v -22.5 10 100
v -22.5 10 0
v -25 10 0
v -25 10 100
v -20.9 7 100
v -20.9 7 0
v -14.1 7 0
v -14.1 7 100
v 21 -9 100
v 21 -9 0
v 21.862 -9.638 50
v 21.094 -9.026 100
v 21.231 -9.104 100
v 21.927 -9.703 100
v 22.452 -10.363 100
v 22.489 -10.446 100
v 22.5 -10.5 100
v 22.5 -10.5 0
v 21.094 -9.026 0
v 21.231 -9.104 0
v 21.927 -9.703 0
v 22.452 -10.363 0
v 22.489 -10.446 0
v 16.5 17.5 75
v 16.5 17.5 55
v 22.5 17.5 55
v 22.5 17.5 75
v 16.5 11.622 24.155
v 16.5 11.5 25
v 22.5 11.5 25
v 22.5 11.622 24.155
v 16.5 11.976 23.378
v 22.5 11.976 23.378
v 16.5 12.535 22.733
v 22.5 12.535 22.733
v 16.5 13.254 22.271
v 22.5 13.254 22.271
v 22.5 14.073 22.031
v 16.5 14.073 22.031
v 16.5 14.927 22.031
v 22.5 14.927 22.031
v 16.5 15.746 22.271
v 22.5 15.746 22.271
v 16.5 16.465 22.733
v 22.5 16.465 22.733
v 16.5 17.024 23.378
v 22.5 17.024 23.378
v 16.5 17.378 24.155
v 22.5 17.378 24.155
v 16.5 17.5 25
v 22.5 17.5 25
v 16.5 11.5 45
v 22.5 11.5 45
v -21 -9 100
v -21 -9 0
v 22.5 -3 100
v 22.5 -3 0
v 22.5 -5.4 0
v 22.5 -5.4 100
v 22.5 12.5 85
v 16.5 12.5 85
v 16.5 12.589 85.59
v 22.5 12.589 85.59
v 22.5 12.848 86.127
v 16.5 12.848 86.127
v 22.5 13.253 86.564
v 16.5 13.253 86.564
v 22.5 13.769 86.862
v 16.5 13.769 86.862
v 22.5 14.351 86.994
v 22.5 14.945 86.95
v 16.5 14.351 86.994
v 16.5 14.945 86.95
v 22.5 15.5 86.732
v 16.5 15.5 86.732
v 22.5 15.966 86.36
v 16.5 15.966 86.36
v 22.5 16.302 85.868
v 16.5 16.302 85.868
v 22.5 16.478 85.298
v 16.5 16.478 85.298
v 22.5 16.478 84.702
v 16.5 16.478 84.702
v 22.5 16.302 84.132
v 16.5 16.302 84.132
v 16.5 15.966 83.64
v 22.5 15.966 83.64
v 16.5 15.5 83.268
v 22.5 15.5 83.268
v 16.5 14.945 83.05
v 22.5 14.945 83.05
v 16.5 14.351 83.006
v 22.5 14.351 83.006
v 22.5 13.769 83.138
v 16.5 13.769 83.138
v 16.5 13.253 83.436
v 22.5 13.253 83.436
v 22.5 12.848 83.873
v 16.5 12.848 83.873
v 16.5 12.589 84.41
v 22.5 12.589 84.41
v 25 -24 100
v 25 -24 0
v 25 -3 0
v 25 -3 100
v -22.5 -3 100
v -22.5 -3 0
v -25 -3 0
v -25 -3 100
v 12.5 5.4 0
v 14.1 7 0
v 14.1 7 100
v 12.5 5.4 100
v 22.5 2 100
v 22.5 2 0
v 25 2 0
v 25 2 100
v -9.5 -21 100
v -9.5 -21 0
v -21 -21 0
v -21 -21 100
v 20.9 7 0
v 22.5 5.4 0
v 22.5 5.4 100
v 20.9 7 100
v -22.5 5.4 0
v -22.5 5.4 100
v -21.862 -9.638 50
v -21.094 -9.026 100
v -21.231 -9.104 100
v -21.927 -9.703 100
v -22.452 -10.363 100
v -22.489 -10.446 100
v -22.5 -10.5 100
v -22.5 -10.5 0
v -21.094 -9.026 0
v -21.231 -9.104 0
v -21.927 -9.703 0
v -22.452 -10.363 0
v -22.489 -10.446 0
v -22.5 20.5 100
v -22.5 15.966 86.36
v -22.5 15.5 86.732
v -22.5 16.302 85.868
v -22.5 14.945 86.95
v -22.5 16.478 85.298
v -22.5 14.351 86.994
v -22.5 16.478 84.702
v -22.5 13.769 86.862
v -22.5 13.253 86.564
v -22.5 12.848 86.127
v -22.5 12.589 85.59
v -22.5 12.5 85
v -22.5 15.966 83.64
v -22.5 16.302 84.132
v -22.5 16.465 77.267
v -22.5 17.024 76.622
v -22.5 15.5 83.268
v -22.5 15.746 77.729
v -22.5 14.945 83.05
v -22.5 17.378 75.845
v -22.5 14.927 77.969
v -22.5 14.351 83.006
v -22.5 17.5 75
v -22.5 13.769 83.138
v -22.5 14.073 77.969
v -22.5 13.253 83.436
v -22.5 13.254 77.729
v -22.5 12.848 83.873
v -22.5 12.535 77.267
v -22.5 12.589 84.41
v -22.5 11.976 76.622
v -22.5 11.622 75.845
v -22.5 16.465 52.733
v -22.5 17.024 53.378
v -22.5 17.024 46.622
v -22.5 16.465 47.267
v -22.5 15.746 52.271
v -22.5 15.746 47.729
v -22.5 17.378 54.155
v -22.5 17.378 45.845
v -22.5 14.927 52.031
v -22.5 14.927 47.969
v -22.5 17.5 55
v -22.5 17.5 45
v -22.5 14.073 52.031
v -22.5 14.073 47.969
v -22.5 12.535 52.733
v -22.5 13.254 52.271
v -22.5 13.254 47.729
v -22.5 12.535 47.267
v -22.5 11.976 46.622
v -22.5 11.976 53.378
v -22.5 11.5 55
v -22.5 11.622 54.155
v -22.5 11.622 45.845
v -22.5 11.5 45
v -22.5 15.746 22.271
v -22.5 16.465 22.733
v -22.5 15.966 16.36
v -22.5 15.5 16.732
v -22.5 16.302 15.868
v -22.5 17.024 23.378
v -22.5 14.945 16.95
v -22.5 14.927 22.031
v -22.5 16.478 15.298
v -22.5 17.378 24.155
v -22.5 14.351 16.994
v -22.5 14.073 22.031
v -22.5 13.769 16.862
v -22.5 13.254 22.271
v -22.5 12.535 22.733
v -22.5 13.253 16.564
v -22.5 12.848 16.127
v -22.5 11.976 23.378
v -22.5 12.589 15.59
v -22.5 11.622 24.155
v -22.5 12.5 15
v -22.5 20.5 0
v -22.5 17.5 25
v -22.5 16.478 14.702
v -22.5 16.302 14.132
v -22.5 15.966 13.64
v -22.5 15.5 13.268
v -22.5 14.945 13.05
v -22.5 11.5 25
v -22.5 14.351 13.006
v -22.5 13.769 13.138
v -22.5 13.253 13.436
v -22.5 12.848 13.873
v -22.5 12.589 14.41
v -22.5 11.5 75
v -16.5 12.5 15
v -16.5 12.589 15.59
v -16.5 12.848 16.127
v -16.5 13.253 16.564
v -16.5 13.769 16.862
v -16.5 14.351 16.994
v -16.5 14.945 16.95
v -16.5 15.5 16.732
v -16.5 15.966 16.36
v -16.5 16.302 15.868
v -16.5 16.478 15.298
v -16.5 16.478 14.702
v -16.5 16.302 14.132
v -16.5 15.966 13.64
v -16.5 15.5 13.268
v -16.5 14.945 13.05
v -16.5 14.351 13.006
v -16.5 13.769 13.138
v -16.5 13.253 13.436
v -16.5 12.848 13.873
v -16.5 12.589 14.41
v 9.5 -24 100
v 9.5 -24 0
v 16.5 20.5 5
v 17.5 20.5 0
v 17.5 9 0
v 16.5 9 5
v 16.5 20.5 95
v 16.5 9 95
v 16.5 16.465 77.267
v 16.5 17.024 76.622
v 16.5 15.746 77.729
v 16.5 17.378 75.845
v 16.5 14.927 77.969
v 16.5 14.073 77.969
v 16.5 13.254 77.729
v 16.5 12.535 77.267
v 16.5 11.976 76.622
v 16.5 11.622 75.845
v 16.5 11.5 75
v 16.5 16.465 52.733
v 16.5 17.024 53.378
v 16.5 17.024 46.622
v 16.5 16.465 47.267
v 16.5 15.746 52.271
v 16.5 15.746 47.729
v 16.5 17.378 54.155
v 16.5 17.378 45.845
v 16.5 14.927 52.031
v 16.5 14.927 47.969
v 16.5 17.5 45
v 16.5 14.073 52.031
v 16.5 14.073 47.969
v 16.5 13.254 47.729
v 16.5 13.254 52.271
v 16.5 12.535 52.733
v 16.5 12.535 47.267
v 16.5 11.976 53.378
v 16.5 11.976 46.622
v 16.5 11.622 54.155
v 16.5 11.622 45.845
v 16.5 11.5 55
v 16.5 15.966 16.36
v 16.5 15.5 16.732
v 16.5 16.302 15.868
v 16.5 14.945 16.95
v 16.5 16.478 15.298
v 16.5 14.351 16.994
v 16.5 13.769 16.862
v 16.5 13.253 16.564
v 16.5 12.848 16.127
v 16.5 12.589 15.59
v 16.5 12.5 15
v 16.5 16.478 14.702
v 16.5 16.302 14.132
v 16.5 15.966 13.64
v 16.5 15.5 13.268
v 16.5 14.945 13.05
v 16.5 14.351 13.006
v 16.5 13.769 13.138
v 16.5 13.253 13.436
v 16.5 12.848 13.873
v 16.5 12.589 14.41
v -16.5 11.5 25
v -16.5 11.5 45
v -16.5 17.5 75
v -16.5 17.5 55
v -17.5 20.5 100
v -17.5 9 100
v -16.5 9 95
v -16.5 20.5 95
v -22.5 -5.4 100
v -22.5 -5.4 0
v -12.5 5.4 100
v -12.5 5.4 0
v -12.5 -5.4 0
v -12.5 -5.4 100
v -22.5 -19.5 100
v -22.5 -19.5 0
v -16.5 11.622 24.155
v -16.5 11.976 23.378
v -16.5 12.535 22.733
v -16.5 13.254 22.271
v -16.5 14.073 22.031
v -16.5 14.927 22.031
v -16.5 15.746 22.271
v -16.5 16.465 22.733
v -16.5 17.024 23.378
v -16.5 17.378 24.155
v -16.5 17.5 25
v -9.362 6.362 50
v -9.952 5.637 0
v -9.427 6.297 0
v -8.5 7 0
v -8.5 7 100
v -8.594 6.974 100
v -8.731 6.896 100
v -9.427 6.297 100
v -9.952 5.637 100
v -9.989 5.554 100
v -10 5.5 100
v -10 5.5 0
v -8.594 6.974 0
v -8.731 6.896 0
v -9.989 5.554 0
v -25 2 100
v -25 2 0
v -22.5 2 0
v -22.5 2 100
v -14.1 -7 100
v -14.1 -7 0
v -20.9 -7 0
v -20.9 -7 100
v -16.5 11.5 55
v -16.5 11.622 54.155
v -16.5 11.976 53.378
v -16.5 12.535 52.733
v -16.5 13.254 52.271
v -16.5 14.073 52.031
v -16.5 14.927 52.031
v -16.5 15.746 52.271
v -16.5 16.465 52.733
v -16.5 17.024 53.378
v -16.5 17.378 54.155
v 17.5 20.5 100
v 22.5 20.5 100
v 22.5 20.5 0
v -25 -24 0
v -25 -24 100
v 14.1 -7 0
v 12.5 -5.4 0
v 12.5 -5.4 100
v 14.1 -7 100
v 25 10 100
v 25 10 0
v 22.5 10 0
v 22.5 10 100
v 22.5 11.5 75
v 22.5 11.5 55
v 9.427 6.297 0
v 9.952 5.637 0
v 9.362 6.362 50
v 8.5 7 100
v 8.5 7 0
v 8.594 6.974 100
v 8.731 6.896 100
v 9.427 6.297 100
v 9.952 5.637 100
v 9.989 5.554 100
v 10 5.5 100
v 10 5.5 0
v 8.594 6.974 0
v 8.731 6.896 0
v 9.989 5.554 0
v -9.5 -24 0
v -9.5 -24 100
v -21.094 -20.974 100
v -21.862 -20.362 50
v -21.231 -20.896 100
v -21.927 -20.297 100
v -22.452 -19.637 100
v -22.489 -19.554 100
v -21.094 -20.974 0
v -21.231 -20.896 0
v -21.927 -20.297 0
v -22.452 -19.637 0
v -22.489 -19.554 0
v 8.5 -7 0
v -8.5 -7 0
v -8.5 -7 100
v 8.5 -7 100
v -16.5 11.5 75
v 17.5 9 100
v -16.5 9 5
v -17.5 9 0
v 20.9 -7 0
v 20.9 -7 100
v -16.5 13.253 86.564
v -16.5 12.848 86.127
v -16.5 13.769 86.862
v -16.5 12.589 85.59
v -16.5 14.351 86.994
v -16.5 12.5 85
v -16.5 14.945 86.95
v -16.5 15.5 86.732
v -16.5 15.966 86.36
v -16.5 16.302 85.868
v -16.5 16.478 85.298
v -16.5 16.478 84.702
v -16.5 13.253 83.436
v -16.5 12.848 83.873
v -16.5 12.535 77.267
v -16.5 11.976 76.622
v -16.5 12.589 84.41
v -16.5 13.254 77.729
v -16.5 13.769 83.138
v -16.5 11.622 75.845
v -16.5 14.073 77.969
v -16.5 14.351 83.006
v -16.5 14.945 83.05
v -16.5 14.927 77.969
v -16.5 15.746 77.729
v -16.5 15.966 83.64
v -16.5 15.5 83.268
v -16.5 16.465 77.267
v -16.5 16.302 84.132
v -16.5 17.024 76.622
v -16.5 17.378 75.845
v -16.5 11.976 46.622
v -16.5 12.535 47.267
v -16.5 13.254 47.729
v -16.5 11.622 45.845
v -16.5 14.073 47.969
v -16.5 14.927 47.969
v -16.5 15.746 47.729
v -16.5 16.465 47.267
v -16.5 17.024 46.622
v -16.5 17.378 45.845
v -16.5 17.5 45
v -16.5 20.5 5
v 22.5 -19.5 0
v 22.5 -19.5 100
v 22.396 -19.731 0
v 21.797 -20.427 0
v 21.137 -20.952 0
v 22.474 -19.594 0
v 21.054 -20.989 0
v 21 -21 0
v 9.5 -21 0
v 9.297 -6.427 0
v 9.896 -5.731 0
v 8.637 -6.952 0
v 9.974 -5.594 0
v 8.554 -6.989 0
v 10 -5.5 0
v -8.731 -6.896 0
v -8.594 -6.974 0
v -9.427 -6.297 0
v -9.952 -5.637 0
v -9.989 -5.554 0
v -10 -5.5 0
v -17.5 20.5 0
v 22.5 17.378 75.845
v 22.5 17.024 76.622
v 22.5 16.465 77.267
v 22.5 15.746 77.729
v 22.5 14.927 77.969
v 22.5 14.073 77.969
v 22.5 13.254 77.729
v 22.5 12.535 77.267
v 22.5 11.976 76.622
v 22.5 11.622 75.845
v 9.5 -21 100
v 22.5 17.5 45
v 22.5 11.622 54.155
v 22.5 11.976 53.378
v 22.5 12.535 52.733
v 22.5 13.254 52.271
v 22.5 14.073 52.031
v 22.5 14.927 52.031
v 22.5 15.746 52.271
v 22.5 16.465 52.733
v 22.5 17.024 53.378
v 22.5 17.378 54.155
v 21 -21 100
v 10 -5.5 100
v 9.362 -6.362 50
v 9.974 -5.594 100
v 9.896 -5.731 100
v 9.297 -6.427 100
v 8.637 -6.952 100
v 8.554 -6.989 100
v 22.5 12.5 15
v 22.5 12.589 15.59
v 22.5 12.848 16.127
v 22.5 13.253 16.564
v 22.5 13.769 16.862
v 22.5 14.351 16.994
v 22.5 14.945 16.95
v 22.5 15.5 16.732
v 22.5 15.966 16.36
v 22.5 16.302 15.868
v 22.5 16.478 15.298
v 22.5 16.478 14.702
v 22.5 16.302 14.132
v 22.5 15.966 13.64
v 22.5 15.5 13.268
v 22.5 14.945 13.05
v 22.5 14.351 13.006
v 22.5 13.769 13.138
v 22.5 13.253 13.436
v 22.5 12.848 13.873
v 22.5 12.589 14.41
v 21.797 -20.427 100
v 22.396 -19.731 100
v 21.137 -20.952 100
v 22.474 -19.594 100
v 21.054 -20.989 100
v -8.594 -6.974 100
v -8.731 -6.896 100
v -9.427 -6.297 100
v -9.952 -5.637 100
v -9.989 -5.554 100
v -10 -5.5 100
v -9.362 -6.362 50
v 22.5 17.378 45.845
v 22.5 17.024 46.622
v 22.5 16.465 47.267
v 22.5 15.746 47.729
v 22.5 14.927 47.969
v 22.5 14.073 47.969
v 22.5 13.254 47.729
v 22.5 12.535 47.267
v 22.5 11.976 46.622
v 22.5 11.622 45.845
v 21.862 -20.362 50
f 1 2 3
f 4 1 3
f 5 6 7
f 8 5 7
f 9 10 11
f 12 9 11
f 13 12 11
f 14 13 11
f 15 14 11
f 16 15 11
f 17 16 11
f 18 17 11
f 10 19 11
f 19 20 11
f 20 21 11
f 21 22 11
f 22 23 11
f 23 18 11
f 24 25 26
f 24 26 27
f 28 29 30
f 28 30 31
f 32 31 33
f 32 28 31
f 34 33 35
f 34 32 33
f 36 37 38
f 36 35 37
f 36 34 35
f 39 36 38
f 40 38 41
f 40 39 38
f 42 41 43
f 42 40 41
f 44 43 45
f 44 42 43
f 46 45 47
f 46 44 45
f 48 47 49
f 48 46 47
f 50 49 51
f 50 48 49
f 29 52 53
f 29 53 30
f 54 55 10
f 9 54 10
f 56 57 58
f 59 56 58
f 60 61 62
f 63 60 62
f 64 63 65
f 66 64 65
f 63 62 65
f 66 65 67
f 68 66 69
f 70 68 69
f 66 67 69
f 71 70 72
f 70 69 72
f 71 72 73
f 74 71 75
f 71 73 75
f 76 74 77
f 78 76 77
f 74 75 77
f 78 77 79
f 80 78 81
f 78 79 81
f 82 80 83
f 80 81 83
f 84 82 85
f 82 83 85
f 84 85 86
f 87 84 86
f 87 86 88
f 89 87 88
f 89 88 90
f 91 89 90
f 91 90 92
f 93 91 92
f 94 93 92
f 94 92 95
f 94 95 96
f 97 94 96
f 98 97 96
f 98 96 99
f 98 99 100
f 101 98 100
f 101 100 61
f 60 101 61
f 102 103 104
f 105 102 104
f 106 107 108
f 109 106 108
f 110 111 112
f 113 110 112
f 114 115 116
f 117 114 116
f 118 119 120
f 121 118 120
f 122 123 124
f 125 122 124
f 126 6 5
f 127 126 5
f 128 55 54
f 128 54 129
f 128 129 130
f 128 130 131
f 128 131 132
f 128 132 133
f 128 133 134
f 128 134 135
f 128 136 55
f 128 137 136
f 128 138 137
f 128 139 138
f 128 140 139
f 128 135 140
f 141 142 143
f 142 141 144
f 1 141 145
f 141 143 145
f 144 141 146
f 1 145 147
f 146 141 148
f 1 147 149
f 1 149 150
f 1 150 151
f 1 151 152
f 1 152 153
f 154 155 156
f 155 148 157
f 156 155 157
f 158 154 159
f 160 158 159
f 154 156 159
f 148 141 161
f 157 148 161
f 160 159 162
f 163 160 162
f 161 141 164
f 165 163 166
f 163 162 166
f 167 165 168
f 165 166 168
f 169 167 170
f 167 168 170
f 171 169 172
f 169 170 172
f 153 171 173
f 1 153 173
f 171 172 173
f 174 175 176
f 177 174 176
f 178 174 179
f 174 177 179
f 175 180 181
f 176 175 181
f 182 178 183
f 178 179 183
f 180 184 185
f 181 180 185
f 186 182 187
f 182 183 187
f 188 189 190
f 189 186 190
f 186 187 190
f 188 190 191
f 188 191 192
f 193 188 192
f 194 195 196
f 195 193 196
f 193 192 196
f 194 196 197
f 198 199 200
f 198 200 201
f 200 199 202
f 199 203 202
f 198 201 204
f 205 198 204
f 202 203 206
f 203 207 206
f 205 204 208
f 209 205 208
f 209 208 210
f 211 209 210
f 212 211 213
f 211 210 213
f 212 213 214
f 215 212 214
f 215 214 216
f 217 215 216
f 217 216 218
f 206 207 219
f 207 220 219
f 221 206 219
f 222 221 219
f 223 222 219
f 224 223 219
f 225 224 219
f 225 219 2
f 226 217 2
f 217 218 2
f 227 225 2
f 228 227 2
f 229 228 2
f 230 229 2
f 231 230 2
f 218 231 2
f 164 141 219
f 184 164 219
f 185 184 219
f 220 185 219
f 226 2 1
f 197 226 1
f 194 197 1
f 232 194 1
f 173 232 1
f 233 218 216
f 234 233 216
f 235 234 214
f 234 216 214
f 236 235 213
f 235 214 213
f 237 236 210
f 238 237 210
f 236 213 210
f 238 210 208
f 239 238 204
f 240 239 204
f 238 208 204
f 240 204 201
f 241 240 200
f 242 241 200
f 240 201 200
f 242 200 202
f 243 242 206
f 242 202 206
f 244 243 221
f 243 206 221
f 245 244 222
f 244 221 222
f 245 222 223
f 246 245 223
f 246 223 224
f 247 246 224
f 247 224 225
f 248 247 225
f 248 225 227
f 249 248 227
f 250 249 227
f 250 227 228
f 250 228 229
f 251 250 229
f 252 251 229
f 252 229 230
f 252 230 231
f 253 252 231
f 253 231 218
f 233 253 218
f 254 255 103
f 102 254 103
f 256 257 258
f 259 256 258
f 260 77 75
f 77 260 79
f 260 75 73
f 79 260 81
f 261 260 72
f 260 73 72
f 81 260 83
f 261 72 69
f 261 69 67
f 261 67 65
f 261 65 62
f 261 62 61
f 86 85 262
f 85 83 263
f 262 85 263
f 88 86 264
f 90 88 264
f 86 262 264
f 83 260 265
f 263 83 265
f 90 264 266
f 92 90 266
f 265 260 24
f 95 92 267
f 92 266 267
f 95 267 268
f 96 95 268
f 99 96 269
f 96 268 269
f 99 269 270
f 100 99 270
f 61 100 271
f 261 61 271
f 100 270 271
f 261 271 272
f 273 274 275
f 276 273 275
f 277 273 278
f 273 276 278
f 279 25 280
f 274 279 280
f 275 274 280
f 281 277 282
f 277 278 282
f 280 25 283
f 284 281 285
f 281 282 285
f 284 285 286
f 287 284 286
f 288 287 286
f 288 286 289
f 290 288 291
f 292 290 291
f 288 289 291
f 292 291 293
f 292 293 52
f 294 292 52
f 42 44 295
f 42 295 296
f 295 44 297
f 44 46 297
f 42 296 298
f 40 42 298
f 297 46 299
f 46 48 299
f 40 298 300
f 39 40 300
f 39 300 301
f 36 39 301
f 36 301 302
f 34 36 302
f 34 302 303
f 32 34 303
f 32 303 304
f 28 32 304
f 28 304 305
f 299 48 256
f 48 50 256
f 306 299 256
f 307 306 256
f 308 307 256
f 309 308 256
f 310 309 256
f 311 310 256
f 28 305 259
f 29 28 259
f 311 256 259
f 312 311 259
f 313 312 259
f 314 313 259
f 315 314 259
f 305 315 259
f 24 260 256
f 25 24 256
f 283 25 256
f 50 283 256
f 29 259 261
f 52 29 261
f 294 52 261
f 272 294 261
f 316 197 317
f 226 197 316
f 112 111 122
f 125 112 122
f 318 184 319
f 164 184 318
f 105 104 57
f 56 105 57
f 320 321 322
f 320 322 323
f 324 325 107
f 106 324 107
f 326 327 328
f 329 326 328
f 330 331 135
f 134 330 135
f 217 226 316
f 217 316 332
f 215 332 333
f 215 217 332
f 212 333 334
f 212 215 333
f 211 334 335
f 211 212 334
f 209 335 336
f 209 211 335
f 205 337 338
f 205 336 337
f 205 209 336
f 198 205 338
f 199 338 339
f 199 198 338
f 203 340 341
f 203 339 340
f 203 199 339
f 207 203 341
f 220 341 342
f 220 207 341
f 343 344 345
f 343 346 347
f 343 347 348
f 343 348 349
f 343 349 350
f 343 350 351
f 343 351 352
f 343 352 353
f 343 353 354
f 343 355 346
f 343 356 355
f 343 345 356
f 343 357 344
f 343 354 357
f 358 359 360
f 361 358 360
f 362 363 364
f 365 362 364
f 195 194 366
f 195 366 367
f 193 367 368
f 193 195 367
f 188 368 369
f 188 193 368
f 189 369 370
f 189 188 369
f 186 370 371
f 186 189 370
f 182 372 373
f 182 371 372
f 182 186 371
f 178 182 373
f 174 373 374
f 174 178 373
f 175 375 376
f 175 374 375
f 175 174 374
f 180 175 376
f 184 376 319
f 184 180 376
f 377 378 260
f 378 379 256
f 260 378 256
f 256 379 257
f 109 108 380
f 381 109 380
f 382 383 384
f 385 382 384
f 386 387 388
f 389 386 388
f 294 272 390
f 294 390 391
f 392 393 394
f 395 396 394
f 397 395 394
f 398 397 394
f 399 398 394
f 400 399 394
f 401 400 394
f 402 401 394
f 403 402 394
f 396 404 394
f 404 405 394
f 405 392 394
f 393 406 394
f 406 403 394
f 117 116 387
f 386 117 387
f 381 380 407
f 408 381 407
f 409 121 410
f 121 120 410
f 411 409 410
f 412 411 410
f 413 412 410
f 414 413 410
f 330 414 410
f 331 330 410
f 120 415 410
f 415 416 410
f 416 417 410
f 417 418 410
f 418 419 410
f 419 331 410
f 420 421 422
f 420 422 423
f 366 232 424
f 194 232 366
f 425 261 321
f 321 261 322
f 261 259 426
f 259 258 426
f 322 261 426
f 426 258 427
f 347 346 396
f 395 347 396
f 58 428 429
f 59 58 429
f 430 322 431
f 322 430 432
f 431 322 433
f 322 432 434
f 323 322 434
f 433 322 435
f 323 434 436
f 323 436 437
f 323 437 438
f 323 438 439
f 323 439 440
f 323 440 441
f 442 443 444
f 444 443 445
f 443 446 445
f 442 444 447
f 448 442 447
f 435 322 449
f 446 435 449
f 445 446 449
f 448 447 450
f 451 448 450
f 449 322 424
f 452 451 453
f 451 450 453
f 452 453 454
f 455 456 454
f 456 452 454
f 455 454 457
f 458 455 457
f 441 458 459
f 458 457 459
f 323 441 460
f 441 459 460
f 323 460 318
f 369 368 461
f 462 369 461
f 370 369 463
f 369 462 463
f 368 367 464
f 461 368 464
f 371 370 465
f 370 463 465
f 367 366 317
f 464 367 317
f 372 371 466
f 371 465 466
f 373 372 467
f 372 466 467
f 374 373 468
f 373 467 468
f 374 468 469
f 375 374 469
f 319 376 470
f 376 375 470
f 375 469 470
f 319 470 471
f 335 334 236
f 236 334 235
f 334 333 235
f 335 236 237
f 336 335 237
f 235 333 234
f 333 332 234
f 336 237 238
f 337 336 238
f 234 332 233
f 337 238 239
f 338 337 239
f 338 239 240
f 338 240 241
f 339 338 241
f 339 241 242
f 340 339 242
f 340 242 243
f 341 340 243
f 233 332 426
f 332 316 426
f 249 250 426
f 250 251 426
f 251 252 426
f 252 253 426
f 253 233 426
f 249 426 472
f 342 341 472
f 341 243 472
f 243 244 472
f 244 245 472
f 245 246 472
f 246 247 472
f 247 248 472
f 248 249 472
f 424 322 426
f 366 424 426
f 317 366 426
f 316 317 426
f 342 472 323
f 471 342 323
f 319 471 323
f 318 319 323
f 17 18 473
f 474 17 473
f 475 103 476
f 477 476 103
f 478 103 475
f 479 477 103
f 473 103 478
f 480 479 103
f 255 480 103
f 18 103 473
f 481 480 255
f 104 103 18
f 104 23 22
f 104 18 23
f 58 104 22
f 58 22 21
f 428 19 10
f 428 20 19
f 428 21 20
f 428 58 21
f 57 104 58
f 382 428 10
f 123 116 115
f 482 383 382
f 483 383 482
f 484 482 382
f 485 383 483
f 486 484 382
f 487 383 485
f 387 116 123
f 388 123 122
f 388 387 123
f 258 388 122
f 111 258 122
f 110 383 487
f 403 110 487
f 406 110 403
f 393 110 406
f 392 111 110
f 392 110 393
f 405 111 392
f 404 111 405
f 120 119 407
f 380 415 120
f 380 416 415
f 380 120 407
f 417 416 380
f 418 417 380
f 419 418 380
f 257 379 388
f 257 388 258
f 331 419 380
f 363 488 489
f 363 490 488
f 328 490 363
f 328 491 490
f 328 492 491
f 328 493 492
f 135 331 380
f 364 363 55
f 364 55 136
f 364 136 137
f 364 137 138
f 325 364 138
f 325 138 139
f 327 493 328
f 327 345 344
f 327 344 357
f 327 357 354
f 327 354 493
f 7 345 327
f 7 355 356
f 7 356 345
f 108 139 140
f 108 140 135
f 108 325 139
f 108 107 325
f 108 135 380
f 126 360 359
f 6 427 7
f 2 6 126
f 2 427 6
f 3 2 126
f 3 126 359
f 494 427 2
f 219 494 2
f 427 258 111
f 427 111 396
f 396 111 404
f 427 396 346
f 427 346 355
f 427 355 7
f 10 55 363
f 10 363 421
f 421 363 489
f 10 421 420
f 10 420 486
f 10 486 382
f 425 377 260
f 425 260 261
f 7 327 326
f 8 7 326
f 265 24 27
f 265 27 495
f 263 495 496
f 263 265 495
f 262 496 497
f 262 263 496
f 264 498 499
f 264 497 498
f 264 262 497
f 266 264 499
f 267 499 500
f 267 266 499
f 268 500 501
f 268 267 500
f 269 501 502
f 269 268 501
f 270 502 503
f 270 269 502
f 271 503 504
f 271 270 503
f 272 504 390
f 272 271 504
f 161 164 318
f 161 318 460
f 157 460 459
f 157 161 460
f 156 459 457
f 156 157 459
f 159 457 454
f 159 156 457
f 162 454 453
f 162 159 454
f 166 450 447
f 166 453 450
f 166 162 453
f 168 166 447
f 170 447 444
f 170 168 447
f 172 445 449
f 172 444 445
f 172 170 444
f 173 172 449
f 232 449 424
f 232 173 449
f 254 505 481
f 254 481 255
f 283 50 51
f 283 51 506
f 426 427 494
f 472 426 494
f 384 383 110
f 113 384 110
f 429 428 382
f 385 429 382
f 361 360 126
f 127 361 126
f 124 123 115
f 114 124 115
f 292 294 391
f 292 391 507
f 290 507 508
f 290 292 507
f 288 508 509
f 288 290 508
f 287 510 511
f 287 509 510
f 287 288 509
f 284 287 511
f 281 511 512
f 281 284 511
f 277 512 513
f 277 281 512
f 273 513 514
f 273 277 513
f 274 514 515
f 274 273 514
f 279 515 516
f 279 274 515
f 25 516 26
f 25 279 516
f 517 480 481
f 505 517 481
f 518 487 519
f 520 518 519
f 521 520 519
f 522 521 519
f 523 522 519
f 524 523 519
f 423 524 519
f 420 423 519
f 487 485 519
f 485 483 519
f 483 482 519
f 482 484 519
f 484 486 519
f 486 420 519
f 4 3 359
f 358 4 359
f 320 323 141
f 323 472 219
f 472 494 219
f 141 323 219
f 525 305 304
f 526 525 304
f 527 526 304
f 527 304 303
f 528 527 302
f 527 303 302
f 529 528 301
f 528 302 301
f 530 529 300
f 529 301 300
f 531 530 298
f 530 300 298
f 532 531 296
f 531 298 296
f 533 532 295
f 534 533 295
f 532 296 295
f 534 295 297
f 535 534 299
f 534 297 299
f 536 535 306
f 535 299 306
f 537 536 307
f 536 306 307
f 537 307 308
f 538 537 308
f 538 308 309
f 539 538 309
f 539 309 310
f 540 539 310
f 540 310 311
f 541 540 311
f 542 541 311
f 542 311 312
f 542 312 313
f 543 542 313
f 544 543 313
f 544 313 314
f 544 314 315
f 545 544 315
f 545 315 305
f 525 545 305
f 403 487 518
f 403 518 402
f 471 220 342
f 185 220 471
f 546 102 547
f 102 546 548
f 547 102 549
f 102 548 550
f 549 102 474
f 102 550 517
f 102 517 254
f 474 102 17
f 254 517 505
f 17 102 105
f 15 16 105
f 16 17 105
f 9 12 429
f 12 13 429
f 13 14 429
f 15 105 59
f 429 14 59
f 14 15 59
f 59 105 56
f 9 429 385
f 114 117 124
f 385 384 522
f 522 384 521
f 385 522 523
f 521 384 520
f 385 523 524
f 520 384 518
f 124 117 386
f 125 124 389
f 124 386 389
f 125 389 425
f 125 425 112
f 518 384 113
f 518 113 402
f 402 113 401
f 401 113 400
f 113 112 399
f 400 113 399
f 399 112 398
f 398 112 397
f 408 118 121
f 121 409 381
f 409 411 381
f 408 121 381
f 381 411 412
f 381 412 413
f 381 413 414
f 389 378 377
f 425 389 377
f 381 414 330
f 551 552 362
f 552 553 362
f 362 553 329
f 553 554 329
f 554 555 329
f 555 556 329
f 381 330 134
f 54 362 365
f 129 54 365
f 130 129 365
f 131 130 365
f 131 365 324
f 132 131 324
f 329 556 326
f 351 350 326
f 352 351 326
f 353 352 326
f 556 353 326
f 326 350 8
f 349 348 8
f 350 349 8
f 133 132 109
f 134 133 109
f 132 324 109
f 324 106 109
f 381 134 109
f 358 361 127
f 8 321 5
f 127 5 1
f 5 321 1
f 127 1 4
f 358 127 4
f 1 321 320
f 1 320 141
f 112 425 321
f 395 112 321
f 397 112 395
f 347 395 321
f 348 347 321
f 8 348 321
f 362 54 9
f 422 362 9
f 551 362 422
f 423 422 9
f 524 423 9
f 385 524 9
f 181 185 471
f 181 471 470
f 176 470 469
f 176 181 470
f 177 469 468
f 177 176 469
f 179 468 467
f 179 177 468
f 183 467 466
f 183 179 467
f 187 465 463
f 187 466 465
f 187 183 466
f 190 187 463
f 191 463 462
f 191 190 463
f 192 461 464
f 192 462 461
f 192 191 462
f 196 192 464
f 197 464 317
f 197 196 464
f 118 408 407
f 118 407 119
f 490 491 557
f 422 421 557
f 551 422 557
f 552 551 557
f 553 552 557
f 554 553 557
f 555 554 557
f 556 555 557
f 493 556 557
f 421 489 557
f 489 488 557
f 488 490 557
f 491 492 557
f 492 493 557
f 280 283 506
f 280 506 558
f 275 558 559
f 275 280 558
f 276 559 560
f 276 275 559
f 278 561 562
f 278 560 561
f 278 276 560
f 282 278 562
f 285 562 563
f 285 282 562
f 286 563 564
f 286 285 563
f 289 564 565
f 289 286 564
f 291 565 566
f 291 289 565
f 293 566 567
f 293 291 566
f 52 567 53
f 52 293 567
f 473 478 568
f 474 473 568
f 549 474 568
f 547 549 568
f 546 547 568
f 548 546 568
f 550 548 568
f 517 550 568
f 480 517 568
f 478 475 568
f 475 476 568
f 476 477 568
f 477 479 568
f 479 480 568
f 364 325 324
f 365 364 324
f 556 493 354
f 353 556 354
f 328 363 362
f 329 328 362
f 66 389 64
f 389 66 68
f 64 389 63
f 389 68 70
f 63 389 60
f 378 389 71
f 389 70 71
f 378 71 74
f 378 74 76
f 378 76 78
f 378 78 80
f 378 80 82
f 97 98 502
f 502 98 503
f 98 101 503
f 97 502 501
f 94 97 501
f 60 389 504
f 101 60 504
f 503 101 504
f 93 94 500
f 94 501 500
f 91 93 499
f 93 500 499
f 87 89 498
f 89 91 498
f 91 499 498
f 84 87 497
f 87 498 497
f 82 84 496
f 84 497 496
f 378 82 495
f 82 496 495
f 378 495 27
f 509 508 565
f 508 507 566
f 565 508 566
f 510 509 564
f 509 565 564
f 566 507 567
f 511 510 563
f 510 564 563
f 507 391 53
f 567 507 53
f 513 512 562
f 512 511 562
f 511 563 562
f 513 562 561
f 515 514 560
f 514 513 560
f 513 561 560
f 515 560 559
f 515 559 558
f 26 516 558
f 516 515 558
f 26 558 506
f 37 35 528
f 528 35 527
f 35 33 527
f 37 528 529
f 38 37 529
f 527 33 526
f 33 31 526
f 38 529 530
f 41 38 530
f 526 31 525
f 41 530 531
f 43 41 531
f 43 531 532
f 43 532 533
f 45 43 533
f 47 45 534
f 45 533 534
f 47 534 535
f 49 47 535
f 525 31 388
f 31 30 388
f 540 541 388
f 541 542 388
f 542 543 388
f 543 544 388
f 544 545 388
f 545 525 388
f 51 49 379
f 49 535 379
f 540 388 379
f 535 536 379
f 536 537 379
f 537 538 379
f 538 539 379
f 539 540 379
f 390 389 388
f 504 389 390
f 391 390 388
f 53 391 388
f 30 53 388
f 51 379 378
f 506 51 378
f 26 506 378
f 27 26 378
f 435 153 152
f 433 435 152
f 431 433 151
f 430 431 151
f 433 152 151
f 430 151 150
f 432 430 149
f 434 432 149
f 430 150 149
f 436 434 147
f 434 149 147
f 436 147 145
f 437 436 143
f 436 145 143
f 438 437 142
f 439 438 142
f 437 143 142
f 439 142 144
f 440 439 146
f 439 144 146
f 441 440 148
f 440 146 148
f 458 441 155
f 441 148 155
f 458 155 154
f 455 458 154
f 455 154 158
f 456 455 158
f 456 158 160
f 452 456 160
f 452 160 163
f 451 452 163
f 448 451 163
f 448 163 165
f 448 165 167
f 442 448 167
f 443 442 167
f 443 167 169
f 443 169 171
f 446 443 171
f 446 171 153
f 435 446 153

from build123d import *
from OCP.BRepFilletAPI import BRepFilletAPI_MakeChamfer

# Parameters (mm, degrees)
SCHIZZO1_W                   = 20
SCHIZZO1_H                   = 14
ESTRUSIONE_ESTRUSIONE1_DEPTH = 100
RACCORDO1_SIZE               = 1.5
SMUSSO1_SIZE                 = 1.6
SCHIZZO2_R                   = 2
TAGLIO_ESTRUSIONE1_DEPTH     = 100
SMUSSO2_SIZE                 = 5
SMUSSO2_SIZE2                = 1.000006128
SMUSSO3_SIZE                 = 5
SMUSSO3_SIZE2                = 1.000006128


with BuildPart() as part:
    # Schizzo1 → Estrusione-Estrusione1 (new body)
    with BuildSketch(Plane.XY):
        Polygon((-22.5, -9), (22.5, -9), (22.5, -21), (9.5, -21), (9.5, -24), (25, -24), (25, -3), (22.5, -3), (22.5, -7), (12.5, -7), (12.5, 7), (22.5, 7), (22.5, 2), (25, 2), (25, 10), (22.5, 10), (22.5, 20.5), (16.5, 20.5), (16.5, 9), (-16.5, 9), (-16.5, 20.5), (-22.5, 20.5), (-22.5, 10), (-25, 10), (-25, 2), (-22.5, 2), (-22.5, 7), (-12.5, 7), (-12.5, -7), (-22.5, -7), (-22.5, -3), (-25, -3), (-25, -24), (-9.5, -24), (-9.5, -21), (-22.5, -21), align=None)
        Rectangle(SCHIZZO1_W, SCHIZZO1_H, mode=Mode.SUBTRACT)
    extrude(amount=ESTRUSIONE_ESTRUSIONE1_DEPTH)

    # Raccordo1
    # a fillet whose section is not a circle: 1.5 mm, written as the material it adds along each edge
    with BuildSketch(Plane(origin=(-10, -7, 0), x_dir=(1, 0, 0), z_dir=(0, 0, 1)), Plane(origin=(10, 7, 0), x_dir=(-1, 0, 0), z_dir=(0, 0, 1)), Plane(origin=(10, -7, 0), x_dir=(0, 1, 0), z_dir=(0, 0, 1)), Plane(origin=(22.5, -21, 0), x_dir=(0, 1, 0), z_dir=(0, 0, 1)), Plane(origin=(22.5, -9, 0), x_dir=(-1, 0, 0), z_dir=(0, 0, 1)), Plane(origin=(-22.5, -21, 0), x_dir=(1, 0, 0), z_dir=(0, 0, 1))) as raccordo1_piece_1:
        with BuildLine():
            Bezier((RACCORDO1_SIZE, 0), (0, 0), (0, RACCORDO1_SIZE), weights=[1, 0.176470588, 1])
            Line((0, RACCORDO1_SIZE), (0, 0))
            Line((0, 0), (RACCORDO1_SIZE, 0))
        make_face()
    extrude(amount=100)
    with BuildSketch(Plane(origin=(-10, 7, 0), x_dir=(1, 0, 0), z_dir=(0, 0, 1)), Plane(origin=(-22.5, -9, 0), x_dir=(1, 0, 0), z_dir=(0, 0, 1))) as raccordo1_piece_2:
        with BuildLine():
            Bezier((RACCORDO1_SIZE, 0), (0, 0), (0, -RACCORDO1_SIZE), weights=[1, 0.176470588, 1])
            Line((0, -RACCORDO1_SIZE), (0, 0))
            Line((0, 0), (RACCORDO1_SIZE, 0))
        make_face()
    extrude(amount=100)

    # Smusso1
    smusso1_edges = [part.edges().sort_by_distance(p)[0] for p in [
        (22.5, 7, 50),
        (12.5, 7, 50),
        (12.5, -7, 50),
        (22.5, -7, 50),
        (-22.5, -7, 50),
        (-12.5, -7, 50),
        (-12.5, 7, 50),
        (-22.5, 7, 50),
    ]]
    chamfer(smusso1_edges, length=SMUSSO1_SIZE)

    # Schizzo2 → Taglio-Estrusione1 (cut)
    with BuildSketch(Plane.ZY.offset(22.5)):
        with Locations(Location((85, 14.5, 0), (0, 0, 270))):
            Circle(SCHIZZO2_R)
        with Locations(Location((15, 14.5, 0), (0, 0, 270))):
            Circle(SCHIZZO2_R)
        with BuildLine():
            Line((25, 17.5), (45, 17.5))
            ThreePointArc((45, 17.5), (48, 14.5), (45, 11.5))
            Line((45, 11.5), (25, 11.5))
            ThreePointArc((25, 11.5), (22, 14.5), (25, 17.5))
        make_face()
        with BuildLine():
            Line((55, 17.5), (75, 17.5))
            ThreePointArc((75, 17.5), (78, 14.5), (75, 11.5))
            Line((75, 11.5), (55, 11.5))
            ThreePointArc((55, 11.5), (52, 14.5), (55, 17.5))
        make_face()
    extrude(amount=-TAGLIO_ESTRUSIONE1_DEPTH, mode=Mode.SUBTRACT)

    # Smusso2: one chamfer whose edges measure the first distance from different faces: ONE call of the kernel's chamfer builder (chamfer() names one face for all edges)
    smusso2_edges_1 = [part.edges().sort_by_distance(p)[0] for p in [
        (16.5, 14.75, 100),
    ]]
    smusso2_side_1 = [part.faces().sort_by_distance(p)[0] for p in [
        (16.5, 14.847088672, 50),
    ]]
    smusso2_edges_2 = [part.edges().sort_by_distance(p)[0] for p in [
        (-16.5, 14.75, 100),
    ]]
    smusso2_side_2 = [part.faces().sort_by_distance(p)[0] for p in [
        (-16.5, 14.847088672, 50),
    ]]
    smusso2 = BRepFilletAPI_MakeChamfer(part.part.solid().wrapped)
    for e in smusso2_edges_1:
        smusso2.Add(SMUSSO2_SIZE, SMUSSO2_SIZE2, e.wrapped, smusso2_side_1[0].wrapped)  # the first distance lies on this face
    for e in smusso2_edges_2:
        smusso2.Add(SMUSSO2_SIZE, SMUSSO2_SIZE2, e.wrapped, smusso2_side_2[0].wrapped)  # the first distance lies on this face
    add(Compound.cast(smusso2.Shape()), mode=Mode.REPLACE)

    # Smusso3: one chamfer whose edges measure the first distance from different faces: ONE call of the kernel's chamfer builder (chamfer() names one face for all edges)
    smusso3_edges_1 = [part.edges().sort_by_distance(p)[0] for p in [
        (-16.5, 14.75, 0),
    ]]
    smusso3_side_1 = [part.faces().sort_by_distance(p)[0] for p in [
        (-16.5, 9.956935212, 47.5),
    ]]
    smusso3_edges_2 = [part.edges().sort_by_distance(p)[0] for p in [
        (16.5, 14.75, 0),
    ]]
    smusso3_side_2 = [part.faces().sort_by_distance(p)[0] for p in [
        (16.5, 19.543064788, 47.5),
    ]]
    smusso3 = BRepFilletAPI_MakeChamfer(part.part.solid().wrapped)
    for e in smusso3_edges_1:
        smusso3.Add(SMUSSO3_SIZE, SMUSSO3_SIZE2, e.wrapped, smusso3_side_1[0].wrapped)  # the first distance lies on this face
    for e in smusso3_edges_2:
        smusso3.Add(SMUSSO3_SIZE, SMUSSO3_SIZE2, e.wrapped, smusso3_side_2[0].wrapped)  # the first distance lies on this face
    add(Compound.cast(smusso3.Shape()), mode=Mode.REPLACE)


solid = part.part
